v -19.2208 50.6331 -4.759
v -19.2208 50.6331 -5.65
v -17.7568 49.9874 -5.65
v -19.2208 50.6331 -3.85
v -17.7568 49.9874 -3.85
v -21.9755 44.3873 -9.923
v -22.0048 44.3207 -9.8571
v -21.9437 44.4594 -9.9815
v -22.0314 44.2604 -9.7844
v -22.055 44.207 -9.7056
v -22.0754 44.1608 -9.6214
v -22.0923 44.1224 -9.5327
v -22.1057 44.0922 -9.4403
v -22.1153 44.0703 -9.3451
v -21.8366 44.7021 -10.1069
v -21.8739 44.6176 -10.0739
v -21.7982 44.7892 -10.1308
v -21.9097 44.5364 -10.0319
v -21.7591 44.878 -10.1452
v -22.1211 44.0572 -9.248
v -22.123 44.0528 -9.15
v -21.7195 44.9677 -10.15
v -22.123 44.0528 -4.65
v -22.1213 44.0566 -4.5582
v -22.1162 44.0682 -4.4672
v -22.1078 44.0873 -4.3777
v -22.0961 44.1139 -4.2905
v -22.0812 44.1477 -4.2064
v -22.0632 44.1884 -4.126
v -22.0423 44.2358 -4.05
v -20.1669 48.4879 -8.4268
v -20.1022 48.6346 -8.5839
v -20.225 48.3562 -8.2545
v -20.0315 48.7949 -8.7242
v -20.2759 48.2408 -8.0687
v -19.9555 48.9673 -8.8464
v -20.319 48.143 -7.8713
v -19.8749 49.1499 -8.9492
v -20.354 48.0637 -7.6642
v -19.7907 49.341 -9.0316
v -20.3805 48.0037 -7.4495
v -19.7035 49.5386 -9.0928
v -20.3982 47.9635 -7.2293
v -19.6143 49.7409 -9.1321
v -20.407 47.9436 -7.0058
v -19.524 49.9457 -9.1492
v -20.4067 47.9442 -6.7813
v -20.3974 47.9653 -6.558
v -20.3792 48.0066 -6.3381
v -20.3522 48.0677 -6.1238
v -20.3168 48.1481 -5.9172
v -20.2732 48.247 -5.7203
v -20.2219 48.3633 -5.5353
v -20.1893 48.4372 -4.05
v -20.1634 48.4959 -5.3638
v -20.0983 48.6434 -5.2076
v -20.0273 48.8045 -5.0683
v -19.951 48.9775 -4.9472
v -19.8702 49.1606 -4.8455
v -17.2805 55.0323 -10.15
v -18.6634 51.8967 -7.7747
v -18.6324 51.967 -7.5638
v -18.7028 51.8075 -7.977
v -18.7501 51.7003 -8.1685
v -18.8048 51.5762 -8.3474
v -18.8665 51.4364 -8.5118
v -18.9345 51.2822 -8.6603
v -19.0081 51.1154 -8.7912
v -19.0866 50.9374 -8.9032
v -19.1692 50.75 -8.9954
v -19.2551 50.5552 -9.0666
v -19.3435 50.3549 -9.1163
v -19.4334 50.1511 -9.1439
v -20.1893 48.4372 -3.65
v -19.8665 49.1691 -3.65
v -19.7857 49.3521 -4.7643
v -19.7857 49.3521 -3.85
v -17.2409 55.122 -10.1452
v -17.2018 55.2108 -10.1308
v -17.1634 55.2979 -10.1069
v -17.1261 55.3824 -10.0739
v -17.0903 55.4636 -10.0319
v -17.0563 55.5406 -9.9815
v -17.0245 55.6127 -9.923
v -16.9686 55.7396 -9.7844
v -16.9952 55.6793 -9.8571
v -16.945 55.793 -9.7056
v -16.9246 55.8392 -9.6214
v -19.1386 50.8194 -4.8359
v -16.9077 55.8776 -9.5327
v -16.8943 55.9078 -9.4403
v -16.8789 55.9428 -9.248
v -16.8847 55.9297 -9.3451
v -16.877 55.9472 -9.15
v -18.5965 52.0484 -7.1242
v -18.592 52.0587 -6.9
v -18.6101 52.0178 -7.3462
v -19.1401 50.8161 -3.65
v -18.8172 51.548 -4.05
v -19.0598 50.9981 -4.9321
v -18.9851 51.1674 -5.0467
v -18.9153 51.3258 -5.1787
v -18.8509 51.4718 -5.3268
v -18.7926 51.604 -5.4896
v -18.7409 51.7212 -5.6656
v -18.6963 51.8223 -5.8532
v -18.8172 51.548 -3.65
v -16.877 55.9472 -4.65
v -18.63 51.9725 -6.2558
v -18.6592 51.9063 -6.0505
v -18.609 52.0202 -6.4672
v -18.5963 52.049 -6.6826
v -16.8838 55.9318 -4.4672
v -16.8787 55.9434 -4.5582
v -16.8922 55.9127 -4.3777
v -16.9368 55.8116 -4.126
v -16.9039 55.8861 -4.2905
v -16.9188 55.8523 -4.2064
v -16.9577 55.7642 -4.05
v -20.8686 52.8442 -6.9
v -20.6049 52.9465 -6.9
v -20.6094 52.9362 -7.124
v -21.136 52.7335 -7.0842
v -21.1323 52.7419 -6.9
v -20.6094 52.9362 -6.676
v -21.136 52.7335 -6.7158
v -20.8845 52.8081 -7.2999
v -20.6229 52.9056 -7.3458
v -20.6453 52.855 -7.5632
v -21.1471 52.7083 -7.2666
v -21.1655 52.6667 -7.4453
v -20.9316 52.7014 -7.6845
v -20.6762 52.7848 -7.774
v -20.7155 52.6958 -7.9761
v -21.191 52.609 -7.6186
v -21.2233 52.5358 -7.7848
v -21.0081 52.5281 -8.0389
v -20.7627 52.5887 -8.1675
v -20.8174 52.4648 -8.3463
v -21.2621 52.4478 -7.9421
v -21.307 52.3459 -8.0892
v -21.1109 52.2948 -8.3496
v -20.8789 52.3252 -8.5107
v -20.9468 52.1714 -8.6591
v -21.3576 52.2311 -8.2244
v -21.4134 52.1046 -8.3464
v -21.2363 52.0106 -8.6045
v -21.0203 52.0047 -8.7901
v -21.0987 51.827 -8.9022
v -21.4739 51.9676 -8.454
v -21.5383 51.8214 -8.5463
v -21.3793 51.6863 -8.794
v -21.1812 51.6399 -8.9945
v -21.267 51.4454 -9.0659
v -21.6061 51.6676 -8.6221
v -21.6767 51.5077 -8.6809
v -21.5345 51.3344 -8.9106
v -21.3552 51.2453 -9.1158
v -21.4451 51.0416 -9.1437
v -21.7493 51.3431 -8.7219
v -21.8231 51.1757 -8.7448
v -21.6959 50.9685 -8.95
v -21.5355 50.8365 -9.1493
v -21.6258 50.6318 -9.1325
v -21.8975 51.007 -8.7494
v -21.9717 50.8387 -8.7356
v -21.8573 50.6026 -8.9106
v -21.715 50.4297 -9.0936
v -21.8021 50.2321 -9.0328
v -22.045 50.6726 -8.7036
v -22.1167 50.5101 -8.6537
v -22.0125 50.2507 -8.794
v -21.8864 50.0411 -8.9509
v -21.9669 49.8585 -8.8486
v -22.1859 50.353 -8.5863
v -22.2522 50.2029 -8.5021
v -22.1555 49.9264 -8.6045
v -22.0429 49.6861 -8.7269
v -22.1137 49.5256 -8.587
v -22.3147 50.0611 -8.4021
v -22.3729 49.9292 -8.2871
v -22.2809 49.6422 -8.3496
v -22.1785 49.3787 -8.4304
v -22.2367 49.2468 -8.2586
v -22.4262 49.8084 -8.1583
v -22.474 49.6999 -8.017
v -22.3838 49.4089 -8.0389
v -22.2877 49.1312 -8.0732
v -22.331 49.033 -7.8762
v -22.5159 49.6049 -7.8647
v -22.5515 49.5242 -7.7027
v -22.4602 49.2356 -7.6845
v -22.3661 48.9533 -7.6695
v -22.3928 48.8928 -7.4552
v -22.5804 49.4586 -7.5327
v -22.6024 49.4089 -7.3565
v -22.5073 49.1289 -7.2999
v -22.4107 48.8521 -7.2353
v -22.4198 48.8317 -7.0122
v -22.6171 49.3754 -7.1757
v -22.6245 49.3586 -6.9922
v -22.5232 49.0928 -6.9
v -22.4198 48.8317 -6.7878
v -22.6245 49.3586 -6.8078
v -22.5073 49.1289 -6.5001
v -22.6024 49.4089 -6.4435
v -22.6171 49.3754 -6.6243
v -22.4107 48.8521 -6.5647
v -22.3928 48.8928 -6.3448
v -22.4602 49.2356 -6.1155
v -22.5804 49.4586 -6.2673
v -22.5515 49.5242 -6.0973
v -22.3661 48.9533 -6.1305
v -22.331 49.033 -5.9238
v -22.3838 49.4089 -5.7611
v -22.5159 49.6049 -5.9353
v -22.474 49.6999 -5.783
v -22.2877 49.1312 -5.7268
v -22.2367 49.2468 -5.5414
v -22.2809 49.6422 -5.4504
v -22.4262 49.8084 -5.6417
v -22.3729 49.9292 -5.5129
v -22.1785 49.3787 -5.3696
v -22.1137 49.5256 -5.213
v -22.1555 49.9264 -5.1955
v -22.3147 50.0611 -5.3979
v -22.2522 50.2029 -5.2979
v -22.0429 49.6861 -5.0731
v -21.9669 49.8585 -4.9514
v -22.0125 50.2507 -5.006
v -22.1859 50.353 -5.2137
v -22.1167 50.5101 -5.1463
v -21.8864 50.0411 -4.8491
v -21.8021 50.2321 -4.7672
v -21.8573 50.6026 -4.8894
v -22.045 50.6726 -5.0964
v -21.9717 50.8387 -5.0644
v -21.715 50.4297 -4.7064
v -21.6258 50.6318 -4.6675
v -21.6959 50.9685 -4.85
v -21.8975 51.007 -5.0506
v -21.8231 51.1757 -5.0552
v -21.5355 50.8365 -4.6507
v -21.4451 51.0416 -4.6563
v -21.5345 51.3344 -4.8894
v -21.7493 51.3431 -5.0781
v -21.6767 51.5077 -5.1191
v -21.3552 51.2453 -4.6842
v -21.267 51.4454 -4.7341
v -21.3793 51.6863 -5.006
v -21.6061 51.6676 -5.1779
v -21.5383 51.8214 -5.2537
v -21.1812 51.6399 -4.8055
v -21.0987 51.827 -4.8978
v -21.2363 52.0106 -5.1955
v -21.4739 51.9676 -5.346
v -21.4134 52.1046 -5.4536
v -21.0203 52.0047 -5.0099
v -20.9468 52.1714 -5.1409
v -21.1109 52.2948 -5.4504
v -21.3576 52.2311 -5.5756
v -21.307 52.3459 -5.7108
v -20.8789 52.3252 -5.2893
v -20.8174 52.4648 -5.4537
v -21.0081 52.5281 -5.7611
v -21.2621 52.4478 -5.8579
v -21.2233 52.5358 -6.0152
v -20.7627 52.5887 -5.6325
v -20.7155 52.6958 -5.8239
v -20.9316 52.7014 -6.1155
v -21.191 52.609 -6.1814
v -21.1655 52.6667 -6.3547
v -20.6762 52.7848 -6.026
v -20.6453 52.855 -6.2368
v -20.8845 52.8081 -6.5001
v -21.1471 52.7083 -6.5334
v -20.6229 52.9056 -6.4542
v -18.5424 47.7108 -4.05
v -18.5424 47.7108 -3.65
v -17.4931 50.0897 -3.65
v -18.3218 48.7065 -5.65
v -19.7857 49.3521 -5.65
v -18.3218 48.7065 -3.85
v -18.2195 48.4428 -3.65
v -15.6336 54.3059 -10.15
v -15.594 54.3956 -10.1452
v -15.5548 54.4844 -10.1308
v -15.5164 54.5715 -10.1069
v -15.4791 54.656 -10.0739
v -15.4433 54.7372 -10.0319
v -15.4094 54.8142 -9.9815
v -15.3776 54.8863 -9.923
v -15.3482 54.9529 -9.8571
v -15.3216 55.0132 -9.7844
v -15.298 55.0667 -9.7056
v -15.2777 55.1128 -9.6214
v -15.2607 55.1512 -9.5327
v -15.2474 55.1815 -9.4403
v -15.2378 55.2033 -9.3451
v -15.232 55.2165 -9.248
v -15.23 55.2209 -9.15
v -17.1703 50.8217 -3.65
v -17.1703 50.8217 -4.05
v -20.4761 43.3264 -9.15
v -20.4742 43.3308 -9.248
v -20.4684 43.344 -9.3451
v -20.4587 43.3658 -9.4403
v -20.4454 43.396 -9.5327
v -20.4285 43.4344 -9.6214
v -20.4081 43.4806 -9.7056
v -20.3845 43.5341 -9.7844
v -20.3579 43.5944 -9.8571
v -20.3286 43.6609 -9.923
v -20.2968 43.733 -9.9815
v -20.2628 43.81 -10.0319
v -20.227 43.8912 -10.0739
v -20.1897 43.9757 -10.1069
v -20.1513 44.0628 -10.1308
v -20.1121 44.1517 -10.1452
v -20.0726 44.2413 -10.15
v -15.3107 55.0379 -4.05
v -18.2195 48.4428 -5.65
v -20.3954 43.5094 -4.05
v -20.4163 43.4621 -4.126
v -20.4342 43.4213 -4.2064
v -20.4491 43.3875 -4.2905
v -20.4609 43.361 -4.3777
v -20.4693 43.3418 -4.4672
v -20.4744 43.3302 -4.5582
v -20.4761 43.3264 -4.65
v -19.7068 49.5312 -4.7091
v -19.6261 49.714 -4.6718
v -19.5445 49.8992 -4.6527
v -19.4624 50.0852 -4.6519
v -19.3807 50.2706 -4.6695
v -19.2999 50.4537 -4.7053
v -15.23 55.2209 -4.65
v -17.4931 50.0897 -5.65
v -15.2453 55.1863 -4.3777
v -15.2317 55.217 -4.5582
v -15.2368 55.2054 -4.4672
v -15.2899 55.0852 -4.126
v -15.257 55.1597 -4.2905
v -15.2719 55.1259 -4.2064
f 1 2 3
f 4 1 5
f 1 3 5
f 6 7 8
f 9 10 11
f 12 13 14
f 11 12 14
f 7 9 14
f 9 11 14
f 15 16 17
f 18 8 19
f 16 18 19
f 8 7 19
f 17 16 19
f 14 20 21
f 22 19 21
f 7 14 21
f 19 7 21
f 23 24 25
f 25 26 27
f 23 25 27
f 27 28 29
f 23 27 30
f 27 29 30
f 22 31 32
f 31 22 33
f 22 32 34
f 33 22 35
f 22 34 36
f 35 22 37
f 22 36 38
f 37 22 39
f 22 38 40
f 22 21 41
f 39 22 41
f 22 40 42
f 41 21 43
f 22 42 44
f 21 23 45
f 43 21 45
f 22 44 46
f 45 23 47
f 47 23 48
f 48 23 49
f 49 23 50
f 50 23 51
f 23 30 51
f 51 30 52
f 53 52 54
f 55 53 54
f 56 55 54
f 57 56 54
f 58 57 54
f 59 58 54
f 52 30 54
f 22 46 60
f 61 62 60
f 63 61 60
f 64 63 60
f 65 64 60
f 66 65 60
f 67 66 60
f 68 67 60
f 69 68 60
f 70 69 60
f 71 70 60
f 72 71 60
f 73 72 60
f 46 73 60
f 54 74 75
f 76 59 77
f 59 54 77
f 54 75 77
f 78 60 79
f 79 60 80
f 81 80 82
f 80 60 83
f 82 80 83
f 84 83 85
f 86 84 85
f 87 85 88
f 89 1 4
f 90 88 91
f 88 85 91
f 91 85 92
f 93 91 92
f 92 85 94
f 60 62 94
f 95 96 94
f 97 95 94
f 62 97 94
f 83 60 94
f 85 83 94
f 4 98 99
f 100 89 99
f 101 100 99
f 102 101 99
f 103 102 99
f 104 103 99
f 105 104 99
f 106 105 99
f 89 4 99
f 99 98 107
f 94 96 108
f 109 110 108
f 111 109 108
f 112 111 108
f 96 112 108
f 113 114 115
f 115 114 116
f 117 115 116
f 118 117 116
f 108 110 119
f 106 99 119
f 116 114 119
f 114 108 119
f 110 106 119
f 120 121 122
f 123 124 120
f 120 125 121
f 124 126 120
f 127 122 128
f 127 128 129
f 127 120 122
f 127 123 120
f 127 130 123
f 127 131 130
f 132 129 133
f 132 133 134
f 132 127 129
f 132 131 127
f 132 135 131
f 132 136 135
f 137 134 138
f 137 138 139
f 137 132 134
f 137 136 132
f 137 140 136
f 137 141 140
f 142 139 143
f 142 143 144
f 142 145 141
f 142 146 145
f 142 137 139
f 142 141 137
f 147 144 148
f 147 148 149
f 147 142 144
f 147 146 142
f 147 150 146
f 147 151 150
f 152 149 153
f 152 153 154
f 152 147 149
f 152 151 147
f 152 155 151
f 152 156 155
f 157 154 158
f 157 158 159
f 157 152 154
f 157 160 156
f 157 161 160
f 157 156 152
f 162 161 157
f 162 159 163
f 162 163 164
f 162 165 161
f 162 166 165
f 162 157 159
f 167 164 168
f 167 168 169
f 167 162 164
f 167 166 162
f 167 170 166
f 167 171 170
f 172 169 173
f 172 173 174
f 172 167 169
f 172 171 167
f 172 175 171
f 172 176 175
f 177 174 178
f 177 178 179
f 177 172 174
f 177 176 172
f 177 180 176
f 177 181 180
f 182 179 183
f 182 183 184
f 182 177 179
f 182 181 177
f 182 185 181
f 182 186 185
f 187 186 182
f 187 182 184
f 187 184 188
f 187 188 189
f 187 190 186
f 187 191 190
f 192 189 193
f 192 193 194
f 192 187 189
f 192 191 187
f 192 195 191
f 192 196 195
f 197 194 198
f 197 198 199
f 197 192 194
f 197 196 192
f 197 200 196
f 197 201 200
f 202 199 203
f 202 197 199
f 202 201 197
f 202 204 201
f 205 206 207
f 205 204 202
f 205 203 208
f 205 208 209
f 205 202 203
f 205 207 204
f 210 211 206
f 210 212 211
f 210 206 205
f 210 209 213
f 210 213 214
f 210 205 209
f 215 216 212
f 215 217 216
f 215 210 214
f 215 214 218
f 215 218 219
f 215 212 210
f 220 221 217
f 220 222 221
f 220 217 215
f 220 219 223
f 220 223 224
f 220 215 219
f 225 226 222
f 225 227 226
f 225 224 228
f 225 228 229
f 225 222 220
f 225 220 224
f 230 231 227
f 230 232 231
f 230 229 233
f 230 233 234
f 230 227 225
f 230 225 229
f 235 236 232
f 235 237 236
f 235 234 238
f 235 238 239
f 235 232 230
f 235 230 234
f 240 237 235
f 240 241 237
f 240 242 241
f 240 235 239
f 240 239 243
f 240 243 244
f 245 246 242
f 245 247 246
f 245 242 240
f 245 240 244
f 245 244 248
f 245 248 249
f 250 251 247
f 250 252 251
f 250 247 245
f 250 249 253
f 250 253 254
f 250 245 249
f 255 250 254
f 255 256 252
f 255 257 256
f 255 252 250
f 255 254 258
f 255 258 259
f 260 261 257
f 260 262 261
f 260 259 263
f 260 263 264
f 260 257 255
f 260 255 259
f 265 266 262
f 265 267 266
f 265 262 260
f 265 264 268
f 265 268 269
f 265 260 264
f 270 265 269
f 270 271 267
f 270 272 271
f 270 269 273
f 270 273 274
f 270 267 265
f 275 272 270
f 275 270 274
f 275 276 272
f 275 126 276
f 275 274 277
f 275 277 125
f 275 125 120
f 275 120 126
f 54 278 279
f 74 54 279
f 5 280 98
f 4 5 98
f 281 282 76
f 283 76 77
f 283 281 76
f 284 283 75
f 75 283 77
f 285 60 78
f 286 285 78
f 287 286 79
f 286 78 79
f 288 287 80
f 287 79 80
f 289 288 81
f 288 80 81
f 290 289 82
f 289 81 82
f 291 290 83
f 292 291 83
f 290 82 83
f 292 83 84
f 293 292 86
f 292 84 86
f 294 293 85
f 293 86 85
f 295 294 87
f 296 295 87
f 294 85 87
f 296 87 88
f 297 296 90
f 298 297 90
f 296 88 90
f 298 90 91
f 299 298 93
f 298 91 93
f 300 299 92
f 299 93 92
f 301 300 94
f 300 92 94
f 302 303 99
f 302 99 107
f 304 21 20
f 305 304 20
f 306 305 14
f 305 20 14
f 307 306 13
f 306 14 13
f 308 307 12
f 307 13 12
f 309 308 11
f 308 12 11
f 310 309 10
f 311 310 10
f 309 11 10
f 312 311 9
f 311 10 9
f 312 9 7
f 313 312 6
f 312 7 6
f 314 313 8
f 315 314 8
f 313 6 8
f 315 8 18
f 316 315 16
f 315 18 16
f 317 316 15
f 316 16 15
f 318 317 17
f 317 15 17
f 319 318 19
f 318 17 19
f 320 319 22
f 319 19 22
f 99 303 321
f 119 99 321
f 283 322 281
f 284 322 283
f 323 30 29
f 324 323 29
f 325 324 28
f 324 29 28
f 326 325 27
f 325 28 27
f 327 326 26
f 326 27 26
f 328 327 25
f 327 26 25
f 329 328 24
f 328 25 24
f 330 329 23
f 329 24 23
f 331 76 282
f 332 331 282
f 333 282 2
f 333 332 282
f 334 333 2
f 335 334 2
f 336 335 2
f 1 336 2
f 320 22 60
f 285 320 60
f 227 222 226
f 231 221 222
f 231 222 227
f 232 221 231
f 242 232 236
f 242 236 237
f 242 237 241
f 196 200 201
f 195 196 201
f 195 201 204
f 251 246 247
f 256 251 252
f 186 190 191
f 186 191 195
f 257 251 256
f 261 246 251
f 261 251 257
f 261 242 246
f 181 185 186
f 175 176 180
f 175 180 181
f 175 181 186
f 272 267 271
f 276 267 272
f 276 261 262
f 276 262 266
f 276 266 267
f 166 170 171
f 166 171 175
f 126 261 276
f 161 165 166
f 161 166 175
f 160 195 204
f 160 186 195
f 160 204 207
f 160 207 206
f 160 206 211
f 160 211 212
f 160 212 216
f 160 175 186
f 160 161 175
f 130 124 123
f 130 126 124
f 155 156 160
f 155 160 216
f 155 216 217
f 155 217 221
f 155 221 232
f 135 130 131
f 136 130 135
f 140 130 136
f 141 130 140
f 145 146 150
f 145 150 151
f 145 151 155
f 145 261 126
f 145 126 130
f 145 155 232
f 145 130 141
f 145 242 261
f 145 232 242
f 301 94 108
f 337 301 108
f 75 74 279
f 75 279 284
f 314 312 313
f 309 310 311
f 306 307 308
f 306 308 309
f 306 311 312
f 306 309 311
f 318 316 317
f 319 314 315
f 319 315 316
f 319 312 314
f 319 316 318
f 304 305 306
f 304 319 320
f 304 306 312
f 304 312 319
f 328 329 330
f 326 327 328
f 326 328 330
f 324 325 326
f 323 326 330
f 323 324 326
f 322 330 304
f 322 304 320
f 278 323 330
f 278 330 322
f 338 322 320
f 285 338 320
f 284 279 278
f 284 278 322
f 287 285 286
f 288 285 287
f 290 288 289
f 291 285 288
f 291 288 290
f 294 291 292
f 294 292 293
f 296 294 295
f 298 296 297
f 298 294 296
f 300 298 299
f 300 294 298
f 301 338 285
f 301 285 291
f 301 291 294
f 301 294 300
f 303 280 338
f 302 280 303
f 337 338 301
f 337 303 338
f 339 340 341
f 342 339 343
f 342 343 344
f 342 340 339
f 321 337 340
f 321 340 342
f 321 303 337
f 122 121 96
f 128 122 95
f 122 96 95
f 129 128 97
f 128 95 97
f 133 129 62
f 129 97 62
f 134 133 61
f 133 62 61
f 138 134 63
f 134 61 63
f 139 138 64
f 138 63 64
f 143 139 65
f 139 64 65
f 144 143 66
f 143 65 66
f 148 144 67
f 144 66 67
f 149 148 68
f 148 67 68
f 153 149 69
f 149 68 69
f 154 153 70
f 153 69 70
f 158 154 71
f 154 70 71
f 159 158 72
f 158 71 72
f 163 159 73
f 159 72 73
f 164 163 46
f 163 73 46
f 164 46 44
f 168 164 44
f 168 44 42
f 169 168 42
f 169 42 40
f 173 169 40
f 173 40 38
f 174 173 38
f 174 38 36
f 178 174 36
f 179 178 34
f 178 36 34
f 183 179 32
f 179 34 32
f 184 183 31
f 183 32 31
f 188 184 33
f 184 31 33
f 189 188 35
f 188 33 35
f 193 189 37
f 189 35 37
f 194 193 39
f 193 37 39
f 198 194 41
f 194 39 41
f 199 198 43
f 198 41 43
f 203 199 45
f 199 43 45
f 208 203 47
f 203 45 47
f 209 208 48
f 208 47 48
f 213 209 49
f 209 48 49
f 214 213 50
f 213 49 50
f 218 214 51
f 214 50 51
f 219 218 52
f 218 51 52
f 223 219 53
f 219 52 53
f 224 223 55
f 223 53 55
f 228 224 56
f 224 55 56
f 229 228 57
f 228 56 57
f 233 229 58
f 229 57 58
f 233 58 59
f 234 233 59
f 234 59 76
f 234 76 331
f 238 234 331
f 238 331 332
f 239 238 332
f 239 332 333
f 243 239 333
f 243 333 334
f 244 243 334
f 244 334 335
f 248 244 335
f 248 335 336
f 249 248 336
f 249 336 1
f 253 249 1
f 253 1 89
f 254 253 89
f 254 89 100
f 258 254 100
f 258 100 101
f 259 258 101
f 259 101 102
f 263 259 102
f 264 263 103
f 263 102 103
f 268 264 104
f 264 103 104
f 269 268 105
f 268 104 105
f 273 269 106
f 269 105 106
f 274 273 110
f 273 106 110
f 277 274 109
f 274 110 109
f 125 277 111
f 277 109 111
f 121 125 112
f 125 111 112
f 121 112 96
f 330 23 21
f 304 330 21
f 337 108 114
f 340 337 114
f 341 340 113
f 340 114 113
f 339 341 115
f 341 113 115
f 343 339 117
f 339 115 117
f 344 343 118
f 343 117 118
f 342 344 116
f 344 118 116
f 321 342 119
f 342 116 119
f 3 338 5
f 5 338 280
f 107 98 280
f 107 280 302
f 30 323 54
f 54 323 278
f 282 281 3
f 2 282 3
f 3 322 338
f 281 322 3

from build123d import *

# Parameters (mm, degrees)
PAD036_DEPTH            = 1.8
SKETCH112_R             = 2.25
PAD037_DEPTH            = 2.6
CHAMFER001_SIZE         = 0.4
SKETCH113_W             = 1.4
SKETCH113_H             = 2
SKETCH113_W_2           = 6.443533
SKETCH113_H_2           = 0.4
SKETCH113_W_3           = 7.136163
POCKET007_DEPTH         = 1.8
CHAMFER005_SIZE         = 0.2
BODY035_PLACEMENT_ANGLE = 23.8


with BuildPart() as part:
    # Sketch111 → Pad036 (new body)
    with BuildSketch(Plane.YZ):
        with BuildLine():
            Line((-6.5, 2.25), (-6.5, -2.25))
            ThreePointArc((-6.5, -2.25), (-6.207107, -2.957107), (-5.5, -3.25))
            Line((-5.5, -3.25), (5.5, -3.25))
            ThreePointArc((5.5, -3.25), (6.207107, -2.957107), (6.5, -2.25))
            Line((6.5, -2.25), (6.5, 2.25))
            ThreePointArc((6.5, 2.25), (6.207107, 2.957107), (5.5, 3.25))
            Line((-5.5, 3.25), (5.5, 3.25))
            ThreePointArc((-5.5, 3.25), (-6.207107, 2.957107), (-6.5, 2.25))
        make_face()
    extrude(amount=PAD036_DEPTH)

    # Sketch112 (on Face9 of Pad036) → Pad037 (join)
    with BuildSketch(Plane(origin=(0, 0, 0), x_dir=(0, 1, 0), z_dir=(-1, 0, 0))):
        Circle(SKETCH112_R)
    extrude(amount=PAD037_DEPTH)

    # Chamfer001
    chamfer001_edges = [part.edges().sort_by_distance(p)[0] for p in [
        (-2.6, -2.25, 0),
    ]]
    chamfer(chamfer001_edges, length=CHAMFER001_SIZE)

    # Sketch113 (on Face13 of Chamfer001) → Pocket007 (cut)
    with BuildSketch(Plane.YZ.offset(1.8)):
        with Locations((-0.008084, 2.25)):
            Rectangle(SKETCH113_W, SKETCH113_H)
        with Locations((4.913683, 3.05)):
            Rectangle(SKETCH113_W_2, SKETCH113_H_2)
        with Locations((-5.276165, 3.05)):
            Rectangle(SKETCH113_W_3, SKETCH113_H_2)
    extrude(amount=-POCKET007_DEPTH, mode=Mode.SUBTRACT)

    # Chamfer005
    chamfer005_edges = [part.edges().sort_by_distance(p)[0] for p in [
        (1.8, -0.708084, 2.25),
        (1.8, 0.691916, 2.25),
        (0.9, 0.691916, 3.25),
        (0.9, -0.708084, 3.25),
    ]]
    chamfer(chamfer005_edges, length=CHAMFER005_SIZE)


with BuildPart() as part_1:
    # Body035 placement: moved
    add(part.part.moved(Location((-19.5, 50, -6.9))).rotate(Axis((-19.5, 50, -6.9), (0, 0, -1)), BODY035_PLACEMENT_ANGLE))


solid = part_1.part
